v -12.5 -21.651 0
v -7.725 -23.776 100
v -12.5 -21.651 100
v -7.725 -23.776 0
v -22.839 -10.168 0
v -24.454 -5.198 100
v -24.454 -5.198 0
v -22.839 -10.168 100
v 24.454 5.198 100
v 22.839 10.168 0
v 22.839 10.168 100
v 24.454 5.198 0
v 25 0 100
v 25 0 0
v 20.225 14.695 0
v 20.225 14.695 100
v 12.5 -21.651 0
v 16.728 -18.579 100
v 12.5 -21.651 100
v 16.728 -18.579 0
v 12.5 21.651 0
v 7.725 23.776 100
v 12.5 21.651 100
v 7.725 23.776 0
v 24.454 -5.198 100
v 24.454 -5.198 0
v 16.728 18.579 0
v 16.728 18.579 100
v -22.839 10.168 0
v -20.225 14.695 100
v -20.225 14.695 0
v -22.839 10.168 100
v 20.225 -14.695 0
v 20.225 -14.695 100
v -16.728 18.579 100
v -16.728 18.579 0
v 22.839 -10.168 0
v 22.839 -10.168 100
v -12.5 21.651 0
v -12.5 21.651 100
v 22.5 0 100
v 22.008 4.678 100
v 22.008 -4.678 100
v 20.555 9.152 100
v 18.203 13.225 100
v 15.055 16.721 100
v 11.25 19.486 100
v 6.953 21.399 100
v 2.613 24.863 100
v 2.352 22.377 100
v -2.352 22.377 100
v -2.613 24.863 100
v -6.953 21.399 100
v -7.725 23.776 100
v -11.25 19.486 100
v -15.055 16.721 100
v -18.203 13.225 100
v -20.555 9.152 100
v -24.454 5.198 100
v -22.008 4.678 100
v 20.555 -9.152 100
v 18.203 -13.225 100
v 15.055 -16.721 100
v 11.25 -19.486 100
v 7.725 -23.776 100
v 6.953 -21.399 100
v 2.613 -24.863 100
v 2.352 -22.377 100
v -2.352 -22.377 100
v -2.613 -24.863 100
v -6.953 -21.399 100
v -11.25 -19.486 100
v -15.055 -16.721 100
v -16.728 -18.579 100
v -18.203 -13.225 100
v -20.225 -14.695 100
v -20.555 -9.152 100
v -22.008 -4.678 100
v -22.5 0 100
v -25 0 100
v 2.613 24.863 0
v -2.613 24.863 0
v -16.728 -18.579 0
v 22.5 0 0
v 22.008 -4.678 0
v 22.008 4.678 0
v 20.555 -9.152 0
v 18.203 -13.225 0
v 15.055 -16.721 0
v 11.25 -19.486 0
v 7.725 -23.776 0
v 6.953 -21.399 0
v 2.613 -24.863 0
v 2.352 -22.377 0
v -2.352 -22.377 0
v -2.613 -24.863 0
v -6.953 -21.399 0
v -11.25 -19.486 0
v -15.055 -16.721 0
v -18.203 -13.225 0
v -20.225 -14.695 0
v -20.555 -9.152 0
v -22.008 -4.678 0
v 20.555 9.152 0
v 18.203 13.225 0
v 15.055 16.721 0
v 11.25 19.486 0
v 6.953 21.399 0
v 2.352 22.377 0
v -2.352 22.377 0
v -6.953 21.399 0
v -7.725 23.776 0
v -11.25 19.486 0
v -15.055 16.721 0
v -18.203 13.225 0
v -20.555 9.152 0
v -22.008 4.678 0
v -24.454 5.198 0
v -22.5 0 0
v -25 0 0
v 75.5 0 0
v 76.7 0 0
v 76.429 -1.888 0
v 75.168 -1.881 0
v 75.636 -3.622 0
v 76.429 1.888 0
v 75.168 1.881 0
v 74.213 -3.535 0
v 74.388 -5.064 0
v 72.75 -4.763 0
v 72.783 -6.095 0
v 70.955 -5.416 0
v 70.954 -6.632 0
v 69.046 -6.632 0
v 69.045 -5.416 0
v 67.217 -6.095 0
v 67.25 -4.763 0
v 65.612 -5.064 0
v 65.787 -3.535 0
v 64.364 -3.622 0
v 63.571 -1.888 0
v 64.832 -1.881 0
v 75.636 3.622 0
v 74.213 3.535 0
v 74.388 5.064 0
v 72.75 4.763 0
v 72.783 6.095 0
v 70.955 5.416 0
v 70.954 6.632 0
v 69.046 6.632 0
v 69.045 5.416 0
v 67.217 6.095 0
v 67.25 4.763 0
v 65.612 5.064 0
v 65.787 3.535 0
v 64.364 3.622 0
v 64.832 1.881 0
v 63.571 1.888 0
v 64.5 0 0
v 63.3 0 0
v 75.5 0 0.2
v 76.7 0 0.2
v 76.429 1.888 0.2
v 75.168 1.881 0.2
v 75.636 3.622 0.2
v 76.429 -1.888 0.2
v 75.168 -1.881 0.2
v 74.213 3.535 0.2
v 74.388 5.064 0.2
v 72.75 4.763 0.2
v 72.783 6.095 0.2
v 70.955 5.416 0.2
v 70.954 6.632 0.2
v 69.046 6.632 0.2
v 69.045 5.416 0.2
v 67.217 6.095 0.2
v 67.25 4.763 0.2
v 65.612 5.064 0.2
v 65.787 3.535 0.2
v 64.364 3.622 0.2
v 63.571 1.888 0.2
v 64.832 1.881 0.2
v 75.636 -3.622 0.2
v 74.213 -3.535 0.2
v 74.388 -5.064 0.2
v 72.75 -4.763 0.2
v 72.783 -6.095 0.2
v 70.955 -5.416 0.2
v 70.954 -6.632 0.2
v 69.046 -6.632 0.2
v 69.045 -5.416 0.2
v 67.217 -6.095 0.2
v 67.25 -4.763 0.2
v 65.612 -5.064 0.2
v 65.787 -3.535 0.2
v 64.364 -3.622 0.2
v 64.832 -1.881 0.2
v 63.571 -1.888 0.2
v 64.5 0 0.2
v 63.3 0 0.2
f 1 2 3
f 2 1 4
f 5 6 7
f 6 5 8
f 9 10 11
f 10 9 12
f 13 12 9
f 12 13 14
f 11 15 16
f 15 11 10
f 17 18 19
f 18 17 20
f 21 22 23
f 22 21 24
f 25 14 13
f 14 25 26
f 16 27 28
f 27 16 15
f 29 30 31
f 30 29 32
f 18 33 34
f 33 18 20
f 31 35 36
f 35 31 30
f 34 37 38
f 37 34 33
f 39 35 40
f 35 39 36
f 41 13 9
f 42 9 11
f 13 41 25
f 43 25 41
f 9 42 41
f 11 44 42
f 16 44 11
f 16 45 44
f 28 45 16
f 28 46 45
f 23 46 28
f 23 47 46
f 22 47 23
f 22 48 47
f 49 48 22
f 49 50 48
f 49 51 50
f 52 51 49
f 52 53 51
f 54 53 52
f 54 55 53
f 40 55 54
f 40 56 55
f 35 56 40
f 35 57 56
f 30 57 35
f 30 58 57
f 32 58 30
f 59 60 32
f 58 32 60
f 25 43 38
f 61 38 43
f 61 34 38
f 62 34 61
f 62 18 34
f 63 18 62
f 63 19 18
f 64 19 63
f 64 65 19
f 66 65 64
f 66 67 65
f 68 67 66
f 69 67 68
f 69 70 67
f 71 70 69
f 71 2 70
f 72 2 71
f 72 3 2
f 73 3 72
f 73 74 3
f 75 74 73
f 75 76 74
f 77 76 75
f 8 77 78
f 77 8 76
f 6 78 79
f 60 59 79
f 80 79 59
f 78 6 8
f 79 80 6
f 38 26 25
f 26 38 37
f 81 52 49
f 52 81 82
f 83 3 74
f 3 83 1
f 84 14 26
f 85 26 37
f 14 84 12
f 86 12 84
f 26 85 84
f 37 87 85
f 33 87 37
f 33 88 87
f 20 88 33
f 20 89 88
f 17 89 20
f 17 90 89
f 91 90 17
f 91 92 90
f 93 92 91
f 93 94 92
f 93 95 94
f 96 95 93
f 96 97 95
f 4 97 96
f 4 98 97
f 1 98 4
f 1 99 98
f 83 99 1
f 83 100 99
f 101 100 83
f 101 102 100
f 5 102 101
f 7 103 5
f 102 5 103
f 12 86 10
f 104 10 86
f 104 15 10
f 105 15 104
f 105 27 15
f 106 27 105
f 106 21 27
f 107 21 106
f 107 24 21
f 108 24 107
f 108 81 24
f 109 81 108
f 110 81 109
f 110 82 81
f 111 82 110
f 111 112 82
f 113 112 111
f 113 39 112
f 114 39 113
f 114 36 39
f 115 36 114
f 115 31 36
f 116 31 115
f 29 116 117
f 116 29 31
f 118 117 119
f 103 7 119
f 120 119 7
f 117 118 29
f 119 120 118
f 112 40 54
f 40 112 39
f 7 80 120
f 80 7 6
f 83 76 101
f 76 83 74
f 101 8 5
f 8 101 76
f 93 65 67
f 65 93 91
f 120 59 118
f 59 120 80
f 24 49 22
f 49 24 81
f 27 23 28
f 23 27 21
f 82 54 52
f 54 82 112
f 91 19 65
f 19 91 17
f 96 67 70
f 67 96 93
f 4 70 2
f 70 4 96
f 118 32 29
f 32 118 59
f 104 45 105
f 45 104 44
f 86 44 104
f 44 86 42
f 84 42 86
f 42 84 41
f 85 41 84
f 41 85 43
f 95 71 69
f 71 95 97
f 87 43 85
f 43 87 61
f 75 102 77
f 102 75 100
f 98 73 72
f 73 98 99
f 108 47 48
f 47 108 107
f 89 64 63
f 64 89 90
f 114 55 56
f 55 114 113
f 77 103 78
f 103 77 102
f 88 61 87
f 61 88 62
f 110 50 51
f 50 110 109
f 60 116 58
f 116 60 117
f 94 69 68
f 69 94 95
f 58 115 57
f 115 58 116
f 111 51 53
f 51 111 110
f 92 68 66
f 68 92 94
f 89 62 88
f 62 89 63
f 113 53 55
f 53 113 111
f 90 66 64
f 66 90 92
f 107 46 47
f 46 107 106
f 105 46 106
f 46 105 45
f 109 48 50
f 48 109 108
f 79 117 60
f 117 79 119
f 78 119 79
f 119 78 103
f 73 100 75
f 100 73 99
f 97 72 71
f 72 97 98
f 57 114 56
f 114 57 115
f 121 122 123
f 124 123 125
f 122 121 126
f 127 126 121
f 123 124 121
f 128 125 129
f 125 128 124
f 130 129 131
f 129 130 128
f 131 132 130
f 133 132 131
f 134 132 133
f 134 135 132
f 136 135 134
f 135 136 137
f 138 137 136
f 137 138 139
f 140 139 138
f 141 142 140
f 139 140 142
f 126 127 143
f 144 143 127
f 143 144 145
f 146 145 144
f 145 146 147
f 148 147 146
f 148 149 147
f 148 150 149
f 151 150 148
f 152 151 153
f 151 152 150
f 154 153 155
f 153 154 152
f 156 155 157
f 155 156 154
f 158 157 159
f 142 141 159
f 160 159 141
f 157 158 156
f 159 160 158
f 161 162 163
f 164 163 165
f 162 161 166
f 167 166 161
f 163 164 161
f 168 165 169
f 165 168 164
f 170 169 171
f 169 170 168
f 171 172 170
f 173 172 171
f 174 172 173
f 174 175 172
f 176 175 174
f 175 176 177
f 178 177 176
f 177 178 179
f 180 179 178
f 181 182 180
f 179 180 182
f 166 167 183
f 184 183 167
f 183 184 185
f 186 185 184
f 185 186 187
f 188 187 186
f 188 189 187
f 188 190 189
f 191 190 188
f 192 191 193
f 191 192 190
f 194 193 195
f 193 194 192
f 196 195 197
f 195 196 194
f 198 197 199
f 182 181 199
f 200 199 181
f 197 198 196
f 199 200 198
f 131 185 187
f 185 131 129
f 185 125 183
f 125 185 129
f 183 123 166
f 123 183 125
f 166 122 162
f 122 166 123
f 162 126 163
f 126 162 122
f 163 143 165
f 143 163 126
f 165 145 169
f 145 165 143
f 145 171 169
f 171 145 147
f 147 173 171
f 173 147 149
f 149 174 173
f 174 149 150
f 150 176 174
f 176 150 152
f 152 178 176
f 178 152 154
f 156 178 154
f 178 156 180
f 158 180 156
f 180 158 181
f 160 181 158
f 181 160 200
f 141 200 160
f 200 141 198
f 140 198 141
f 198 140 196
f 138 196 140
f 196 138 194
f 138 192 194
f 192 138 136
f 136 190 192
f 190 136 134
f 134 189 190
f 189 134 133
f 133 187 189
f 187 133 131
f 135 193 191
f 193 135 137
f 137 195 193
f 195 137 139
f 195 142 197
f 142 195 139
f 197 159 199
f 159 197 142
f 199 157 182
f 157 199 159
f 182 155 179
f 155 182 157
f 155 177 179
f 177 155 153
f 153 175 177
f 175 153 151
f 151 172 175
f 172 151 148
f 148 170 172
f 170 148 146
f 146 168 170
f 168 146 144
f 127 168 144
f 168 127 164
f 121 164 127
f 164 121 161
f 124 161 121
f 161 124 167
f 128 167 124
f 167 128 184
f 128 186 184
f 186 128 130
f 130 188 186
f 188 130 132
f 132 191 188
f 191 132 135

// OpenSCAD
module centreRing(out_dia, in_dia, thickness)
{
    linear_extrude(thickness)
    difference()
    {
        circle(out_dia/2);
        circle(in_dia/2);
    }
}

module tube(length, out_dia, in_dia, out_col="red", in_col="yellow")
{
    difference() {
    color(out_col)
    cylinder(length, r=out_dia/2);
    translate([0, 0, -1])
        color(in_col)
        cylinder(length+2, r=in_dia/2);
    }
}

tube(100, 50, 45);

translate([70, 0, 0])
centreRing(13.4, 11, 0.2);
